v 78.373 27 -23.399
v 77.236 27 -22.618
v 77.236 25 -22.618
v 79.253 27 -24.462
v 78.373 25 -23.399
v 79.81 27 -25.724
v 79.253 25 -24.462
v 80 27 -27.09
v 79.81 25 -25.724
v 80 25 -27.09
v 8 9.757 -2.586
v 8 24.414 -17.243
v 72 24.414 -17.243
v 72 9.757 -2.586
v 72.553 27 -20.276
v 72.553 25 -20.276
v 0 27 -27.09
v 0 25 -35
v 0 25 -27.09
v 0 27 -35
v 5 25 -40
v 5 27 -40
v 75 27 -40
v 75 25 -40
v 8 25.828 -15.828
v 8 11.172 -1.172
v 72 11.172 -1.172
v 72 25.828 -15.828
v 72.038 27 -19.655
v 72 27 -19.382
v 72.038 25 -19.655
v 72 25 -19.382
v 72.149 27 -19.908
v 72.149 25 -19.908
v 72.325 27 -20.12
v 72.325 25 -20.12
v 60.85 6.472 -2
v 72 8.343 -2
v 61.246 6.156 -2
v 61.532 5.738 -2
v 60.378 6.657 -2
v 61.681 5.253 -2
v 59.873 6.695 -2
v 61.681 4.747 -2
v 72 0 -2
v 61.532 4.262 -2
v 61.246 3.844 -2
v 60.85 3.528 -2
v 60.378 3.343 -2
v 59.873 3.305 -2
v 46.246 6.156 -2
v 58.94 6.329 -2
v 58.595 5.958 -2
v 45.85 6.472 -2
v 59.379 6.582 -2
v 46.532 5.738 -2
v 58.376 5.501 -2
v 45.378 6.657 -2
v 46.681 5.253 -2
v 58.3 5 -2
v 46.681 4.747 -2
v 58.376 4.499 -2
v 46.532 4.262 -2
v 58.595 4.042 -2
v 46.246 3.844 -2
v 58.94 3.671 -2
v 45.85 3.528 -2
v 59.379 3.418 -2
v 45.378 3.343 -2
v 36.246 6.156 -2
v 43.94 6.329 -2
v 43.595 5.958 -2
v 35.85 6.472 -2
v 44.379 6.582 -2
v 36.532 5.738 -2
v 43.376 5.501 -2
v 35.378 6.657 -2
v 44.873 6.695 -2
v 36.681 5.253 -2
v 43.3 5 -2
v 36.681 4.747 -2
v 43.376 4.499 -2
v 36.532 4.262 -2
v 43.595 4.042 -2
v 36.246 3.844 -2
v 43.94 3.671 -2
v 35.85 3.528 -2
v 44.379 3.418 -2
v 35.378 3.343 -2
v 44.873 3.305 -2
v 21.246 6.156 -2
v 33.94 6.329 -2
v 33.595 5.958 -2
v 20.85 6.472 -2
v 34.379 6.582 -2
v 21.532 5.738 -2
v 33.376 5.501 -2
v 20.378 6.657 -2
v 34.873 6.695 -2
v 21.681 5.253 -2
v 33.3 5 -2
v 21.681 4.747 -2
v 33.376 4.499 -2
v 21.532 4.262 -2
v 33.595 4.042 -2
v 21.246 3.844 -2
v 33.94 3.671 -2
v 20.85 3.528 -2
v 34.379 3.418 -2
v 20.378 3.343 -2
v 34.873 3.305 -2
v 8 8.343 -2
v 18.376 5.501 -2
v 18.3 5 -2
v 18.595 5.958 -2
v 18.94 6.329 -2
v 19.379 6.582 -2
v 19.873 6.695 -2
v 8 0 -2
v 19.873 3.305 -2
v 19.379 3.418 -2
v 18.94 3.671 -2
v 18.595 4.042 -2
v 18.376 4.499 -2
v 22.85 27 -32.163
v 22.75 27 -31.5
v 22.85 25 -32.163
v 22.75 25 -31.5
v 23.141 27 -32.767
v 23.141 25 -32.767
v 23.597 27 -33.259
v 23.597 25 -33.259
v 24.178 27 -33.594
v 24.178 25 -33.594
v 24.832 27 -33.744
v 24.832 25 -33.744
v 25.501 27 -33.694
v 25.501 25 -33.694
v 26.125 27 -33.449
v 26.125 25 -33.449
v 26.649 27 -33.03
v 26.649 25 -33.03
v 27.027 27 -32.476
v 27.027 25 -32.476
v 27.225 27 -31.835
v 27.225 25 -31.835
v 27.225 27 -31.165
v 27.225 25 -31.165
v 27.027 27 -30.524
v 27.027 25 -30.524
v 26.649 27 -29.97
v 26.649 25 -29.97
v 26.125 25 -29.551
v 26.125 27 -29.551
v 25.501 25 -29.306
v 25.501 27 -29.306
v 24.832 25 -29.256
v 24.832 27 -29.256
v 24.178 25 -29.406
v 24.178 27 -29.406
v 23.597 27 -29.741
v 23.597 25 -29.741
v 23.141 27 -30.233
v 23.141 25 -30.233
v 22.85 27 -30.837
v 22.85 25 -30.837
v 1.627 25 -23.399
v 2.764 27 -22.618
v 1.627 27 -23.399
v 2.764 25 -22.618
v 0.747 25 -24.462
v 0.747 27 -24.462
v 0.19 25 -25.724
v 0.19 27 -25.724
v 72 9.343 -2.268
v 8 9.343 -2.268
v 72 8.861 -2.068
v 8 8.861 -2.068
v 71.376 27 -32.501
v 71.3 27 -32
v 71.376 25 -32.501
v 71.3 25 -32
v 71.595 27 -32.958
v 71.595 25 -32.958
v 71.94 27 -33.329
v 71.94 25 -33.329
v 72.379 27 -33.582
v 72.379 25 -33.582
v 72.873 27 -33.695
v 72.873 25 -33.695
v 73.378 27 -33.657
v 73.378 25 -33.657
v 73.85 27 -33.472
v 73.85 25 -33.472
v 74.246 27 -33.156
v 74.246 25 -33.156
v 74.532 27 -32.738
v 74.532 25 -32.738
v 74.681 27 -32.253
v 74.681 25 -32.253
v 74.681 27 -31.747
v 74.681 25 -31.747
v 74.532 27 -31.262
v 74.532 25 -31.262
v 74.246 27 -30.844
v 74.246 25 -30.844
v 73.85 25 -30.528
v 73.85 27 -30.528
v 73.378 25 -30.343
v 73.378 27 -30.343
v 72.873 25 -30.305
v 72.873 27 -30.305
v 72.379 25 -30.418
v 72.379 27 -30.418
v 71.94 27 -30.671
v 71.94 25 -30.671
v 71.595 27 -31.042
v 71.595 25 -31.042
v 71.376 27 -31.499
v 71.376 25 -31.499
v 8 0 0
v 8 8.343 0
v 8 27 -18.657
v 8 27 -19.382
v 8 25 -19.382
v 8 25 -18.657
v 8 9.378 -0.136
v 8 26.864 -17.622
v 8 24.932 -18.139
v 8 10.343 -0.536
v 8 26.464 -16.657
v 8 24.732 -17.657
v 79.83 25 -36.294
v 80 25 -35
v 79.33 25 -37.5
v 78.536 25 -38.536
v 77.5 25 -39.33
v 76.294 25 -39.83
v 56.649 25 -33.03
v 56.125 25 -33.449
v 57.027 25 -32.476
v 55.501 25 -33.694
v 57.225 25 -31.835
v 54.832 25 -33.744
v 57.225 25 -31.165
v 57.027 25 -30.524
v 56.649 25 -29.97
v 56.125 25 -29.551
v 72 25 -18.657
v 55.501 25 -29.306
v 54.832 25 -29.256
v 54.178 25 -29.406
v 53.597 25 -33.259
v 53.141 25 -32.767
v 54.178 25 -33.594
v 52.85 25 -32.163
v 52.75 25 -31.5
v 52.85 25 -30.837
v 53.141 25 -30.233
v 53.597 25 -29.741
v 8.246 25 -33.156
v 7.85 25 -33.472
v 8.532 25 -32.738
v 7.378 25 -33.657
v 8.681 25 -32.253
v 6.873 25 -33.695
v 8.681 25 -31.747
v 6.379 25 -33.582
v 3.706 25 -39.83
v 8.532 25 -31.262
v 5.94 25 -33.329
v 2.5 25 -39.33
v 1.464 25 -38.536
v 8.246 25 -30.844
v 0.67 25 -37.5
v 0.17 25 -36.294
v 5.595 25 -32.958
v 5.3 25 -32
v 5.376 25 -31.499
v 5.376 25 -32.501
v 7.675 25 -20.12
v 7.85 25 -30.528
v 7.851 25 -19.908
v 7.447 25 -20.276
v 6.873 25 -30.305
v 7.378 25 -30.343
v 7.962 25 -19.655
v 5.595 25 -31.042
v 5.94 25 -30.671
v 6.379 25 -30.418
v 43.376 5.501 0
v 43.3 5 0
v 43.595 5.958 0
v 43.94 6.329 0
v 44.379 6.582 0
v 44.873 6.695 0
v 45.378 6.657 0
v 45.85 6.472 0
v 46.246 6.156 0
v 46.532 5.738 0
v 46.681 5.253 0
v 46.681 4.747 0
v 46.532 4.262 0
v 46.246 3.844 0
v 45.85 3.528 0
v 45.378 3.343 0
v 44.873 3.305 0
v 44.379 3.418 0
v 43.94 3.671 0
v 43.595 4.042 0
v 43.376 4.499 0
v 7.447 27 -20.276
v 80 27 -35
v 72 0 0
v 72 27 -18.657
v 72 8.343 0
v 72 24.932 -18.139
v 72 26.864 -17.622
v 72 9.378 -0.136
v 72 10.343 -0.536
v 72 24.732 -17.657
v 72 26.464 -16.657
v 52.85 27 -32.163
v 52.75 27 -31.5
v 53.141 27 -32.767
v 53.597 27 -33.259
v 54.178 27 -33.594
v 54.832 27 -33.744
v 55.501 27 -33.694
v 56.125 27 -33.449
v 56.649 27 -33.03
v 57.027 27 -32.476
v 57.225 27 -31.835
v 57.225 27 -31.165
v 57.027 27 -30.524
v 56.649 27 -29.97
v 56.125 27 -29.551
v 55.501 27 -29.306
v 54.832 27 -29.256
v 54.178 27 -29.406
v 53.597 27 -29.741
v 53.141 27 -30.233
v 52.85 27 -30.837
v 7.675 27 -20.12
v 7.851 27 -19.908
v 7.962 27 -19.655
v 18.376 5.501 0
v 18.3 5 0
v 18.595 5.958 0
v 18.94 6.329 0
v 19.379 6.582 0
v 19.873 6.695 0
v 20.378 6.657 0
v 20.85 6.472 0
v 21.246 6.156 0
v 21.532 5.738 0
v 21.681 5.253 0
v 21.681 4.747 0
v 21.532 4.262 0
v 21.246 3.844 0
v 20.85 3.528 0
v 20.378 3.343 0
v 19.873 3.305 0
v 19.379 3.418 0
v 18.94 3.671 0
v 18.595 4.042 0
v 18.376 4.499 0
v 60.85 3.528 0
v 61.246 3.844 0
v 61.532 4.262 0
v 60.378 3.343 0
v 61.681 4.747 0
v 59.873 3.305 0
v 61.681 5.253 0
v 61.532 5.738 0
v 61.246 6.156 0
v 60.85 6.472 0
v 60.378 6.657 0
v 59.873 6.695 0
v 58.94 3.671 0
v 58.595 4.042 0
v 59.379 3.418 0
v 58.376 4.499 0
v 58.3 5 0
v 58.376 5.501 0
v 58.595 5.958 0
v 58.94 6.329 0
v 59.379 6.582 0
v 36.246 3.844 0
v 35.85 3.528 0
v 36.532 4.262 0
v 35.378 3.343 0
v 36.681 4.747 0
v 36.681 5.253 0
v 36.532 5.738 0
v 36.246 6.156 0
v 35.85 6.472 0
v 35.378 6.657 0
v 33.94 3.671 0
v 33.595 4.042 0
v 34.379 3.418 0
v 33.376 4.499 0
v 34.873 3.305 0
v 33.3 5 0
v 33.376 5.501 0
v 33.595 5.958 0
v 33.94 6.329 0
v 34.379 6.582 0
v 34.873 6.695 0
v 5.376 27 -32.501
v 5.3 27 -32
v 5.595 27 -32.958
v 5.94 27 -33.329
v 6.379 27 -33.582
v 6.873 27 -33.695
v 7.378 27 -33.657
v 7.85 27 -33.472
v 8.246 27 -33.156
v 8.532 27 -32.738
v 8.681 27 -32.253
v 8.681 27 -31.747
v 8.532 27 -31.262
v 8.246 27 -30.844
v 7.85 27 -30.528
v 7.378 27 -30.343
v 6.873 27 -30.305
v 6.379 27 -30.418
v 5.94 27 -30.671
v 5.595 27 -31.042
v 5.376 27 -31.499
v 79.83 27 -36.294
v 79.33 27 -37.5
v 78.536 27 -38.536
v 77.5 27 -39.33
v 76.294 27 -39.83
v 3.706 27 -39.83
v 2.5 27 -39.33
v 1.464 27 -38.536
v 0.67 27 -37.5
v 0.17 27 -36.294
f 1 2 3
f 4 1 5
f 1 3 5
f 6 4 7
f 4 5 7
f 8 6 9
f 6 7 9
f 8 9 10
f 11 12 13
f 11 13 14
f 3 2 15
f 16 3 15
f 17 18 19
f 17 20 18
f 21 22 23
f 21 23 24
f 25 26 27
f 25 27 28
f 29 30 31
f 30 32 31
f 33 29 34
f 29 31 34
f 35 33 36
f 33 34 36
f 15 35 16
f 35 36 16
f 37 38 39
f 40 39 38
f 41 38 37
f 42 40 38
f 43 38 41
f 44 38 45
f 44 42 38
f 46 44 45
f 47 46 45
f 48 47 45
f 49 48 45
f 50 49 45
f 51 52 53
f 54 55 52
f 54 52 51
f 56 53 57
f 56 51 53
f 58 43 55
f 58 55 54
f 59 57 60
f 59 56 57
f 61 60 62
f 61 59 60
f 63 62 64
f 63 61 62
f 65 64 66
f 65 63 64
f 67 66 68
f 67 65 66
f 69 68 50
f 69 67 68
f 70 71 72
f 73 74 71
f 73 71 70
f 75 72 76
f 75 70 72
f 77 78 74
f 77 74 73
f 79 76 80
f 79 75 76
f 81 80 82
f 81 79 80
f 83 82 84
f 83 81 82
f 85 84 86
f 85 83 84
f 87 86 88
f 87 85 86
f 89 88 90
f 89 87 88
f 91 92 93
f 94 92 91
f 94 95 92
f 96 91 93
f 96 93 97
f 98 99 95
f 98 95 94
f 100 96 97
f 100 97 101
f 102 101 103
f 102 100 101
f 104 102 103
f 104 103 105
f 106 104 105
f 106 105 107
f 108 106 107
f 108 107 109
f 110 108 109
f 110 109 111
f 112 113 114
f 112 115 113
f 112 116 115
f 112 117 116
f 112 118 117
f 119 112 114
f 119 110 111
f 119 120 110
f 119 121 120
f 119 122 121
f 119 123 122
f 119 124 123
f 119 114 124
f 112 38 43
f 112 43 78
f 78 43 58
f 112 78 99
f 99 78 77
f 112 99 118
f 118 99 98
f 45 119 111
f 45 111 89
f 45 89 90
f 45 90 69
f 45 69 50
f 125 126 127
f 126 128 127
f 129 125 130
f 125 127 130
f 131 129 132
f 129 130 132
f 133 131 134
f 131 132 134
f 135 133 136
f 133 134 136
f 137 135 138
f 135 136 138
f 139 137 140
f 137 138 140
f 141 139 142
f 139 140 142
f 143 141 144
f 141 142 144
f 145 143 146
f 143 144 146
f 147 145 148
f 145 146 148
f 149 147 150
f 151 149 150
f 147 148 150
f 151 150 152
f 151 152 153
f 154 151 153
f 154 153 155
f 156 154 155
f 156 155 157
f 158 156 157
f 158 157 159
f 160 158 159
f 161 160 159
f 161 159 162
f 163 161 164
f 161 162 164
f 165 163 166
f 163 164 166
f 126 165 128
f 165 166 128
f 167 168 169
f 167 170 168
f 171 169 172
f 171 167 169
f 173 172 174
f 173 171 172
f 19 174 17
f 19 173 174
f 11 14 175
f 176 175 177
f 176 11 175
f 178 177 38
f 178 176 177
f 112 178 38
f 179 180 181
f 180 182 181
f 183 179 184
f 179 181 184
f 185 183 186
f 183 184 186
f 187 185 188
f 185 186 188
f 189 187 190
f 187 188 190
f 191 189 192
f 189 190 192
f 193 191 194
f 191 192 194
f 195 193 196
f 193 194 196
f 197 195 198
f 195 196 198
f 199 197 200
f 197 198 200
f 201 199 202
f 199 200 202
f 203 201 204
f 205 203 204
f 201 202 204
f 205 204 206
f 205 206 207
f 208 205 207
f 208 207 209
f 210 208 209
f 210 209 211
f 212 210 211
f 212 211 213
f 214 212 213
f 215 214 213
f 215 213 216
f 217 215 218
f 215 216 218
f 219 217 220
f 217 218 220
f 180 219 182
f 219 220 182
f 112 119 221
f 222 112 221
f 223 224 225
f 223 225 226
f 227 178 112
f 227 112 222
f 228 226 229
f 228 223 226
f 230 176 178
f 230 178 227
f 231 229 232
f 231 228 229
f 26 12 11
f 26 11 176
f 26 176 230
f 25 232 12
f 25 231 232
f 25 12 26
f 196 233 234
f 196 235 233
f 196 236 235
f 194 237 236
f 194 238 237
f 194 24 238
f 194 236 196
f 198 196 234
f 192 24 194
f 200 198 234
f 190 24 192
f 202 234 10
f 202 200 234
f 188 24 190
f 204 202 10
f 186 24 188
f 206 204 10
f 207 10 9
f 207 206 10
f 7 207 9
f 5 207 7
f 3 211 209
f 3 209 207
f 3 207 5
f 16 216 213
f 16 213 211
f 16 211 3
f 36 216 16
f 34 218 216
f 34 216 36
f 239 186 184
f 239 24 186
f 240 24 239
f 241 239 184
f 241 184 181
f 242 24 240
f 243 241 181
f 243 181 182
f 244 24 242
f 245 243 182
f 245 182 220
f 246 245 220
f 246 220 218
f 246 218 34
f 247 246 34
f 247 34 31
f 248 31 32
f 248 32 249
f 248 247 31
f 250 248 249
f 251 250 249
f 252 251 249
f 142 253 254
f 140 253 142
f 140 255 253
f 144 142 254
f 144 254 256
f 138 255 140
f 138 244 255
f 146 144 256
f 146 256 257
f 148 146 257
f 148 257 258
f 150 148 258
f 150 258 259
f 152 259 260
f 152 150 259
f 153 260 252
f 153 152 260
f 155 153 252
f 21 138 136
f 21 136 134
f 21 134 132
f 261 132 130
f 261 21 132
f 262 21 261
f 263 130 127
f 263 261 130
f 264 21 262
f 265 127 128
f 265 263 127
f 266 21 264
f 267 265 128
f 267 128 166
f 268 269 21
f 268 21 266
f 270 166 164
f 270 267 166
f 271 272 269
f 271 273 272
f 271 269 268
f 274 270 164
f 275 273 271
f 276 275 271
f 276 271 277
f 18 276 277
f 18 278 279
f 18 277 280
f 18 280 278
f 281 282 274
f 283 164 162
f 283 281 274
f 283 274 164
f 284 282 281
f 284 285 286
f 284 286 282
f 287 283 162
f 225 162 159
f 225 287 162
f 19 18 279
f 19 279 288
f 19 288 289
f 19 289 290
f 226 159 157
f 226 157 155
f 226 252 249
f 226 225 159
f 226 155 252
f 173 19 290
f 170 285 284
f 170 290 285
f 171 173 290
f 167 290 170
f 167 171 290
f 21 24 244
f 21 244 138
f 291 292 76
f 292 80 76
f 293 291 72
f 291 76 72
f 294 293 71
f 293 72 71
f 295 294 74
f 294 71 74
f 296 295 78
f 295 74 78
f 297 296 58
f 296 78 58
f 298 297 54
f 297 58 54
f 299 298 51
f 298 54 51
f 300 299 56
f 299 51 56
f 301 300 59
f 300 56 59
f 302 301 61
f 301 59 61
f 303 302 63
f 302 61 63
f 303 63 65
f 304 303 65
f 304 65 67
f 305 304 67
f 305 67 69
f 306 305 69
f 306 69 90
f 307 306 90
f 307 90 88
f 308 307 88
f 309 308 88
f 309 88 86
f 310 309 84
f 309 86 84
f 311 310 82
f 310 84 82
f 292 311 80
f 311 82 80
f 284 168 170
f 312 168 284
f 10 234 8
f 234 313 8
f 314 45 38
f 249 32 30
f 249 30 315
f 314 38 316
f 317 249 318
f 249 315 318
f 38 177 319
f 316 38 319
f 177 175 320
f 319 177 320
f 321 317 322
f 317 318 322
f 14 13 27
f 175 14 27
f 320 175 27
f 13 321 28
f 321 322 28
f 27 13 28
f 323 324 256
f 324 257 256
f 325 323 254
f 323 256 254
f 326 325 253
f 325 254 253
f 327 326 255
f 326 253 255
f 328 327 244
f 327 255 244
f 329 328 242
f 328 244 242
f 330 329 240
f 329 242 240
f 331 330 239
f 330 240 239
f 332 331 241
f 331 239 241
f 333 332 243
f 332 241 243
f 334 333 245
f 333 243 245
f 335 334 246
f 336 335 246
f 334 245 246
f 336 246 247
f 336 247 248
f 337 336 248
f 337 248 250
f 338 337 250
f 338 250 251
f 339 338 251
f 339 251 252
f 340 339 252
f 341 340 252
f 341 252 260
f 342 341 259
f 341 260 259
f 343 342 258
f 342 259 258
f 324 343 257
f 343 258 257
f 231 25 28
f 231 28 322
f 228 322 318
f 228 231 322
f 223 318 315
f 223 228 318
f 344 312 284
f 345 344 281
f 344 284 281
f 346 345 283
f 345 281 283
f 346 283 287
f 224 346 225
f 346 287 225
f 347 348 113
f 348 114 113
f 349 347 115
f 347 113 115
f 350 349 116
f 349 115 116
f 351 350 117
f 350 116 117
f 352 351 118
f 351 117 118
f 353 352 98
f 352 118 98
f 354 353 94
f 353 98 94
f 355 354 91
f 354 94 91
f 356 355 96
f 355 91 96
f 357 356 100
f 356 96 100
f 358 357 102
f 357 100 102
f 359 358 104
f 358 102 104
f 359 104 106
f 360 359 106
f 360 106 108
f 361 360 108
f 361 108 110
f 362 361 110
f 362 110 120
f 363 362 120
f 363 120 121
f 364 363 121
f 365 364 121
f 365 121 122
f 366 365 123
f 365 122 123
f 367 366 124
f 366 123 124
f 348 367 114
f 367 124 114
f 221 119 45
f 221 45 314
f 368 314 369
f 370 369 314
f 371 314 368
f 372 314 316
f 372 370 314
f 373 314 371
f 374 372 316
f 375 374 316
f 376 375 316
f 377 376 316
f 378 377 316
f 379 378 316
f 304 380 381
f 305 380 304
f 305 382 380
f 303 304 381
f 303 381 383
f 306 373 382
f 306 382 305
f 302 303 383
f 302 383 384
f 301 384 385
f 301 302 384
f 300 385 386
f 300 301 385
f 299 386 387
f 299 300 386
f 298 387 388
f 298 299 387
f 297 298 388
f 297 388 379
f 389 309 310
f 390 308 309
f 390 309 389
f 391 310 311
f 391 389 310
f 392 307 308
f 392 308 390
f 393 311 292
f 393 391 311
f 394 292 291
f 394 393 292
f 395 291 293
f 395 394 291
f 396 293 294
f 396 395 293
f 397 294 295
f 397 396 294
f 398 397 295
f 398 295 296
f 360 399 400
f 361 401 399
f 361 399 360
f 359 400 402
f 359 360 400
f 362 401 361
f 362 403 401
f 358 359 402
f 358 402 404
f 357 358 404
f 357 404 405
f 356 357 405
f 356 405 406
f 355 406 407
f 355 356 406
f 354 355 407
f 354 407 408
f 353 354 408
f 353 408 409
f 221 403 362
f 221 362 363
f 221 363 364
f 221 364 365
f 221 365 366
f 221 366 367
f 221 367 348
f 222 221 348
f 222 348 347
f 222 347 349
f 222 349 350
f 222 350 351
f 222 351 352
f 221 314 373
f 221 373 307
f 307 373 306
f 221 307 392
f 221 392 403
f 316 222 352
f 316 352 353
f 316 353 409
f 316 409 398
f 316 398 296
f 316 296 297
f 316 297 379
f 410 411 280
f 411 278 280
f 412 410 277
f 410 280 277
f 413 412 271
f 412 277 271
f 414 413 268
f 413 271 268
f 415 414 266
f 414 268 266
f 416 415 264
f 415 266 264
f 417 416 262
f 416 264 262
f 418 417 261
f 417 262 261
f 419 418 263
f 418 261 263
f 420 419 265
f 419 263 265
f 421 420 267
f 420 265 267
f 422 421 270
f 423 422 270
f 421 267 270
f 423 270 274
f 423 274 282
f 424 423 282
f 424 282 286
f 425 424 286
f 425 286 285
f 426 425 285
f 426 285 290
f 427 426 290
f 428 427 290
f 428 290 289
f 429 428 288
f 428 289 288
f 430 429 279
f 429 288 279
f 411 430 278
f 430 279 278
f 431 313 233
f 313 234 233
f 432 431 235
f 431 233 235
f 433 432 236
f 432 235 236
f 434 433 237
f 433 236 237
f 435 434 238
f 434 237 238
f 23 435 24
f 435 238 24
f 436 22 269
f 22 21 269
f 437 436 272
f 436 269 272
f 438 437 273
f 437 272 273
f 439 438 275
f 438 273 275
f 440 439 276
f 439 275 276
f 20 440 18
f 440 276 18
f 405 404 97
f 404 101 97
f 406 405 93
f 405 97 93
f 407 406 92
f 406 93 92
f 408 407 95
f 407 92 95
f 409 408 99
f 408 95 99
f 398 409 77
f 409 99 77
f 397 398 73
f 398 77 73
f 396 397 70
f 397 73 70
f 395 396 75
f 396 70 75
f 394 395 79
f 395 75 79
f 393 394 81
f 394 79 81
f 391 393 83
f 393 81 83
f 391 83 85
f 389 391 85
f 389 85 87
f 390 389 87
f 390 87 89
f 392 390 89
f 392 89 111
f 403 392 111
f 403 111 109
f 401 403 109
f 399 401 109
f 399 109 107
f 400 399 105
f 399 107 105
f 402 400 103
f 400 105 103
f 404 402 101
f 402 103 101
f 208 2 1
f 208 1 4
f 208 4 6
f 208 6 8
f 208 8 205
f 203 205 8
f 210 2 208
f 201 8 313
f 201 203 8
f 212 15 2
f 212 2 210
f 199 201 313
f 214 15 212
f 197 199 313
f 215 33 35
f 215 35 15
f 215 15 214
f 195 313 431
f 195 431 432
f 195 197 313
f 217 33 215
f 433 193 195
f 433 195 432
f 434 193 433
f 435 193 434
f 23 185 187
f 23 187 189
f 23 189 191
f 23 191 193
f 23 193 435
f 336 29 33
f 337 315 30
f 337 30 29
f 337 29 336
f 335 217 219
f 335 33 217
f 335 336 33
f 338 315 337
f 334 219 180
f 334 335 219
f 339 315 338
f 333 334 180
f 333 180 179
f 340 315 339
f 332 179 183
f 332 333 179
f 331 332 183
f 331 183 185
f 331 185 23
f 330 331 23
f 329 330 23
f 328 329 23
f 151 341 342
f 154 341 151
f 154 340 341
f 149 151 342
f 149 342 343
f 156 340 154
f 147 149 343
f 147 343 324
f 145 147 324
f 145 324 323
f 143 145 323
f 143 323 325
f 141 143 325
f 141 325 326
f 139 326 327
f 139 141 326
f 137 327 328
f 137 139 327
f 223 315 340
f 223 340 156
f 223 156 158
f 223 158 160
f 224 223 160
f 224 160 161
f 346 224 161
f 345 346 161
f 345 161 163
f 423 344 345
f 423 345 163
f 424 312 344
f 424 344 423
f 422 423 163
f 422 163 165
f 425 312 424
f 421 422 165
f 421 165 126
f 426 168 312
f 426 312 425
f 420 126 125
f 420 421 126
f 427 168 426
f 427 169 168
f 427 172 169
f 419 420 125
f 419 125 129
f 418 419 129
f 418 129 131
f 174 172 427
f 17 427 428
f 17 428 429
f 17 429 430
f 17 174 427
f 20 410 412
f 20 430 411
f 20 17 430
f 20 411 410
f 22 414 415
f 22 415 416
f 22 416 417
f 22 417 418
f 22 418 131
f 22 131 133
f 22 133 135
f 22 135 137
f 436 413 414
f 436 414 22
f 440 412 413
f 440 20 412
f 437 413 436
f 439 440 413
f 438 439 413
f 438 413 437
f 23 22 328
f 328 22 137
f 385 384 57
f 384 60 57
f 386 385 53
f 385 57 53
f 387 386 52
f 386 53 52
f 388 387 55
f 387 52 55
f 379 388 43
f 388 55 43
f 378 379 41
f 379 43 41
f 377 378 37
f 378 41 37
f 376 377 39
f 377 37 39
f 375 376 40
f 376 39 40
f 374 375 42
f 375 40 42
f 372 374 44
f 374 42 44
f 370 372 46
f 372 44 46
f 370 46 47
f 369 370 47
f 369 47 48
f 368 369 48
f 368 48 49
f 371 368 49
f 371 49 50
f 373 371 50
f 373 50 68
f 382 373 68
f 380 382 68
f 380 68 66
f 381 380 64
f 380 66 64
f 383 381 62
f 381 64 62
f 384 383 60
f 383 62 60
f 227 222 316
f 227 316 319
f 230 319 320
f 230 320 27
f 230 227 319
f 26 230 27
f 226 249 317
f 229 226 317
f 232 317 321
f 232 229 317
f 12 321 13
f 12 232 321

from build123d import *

# Parameters (mm, degrees)
BASE_FLANGE1_DEPTH       = 80
CUT_EXTRUDE1_DEPTH       = 94.429117517
M3_CLEARANCE_HOLE1_D     = 3.4
M3_CLEARANCE_HOLE1_DEPTH = 2
M3_CLEARANCE_HOLE1_TIP   = 1.021463052
M4_CLEARANCE_HOLE1_D     = 4.5
M4_CLEARANCE_HOLE1_DEPTH = 2
M4_CLEARANCE_HOLE1_TIP   = 1.351936393
M3_CLEARANCE_HOLE2_D     = 3.4
M3_CLEARANCE_HOLE2_DEPTH = 2
M3_CLEARANCE_HOLE2_TIP   = 1.021463052
FILLET1_R                = 5
FILLET2_R                = 1


# Sheet-metal steps are written as plain solids
with BuildPart() as part:
    # Sketch1 → Base-Flange1 (new body)
    with BuildSketch(Plane(origin=(0, 0, 0), x_dir=(0, 0, -1), z_dir=(1, 0, 0))):
        with BuildLine():
            Line((0, 0), (0, 8.343145751))
            ThreePointArc((0, 8.343145751), (0.30448187, 9.87387948), (1.171572875, 11.171572875))
            Line((1.171572875, 11.171572875), (15.828427125, 25.828427125))
            ThreePointArc((15.828427125, 25.828427125), (17.12612052, 26.69551813), (18.656854249, 27))
            Line((18.656854249, 27), (40, 27))
            Line((40, 27), (40, 25))
            Line((40, 25), (18.656854249, 25))
            ThreePointArc((18.656854249, 25), (17.891487385, 24.847759065), (17.242640687, 24.414213562))
            Line((17.242640687, 24.414213562), (2.585786438, 9.757359313))
            ThreePointArc((2.585786438, 9.757359313), (2.152240935, 9.108512615), (2, 8.343145751))
            Line((2, 8.343145751), (2, 0))
            Line((2, 0), (0, 0))
        make_face()
    extrude(amount=BASE_FLANGE1_DEPTH)

    # Sketch2 → Cut-Extrude1 (cut, through all)
    with BuildSketch(Plane(origin=(0, 27, 0), x_dir=(1, 0, 0), z_dir=(0, 1, 0))):
        Polygon((0, 24), (8, 20), (8, 0), (0, 0), align=None)
        Polygon((80, 0), (80, 24), (72, 20), (72, 0), align=None)
    extrude(amount=-CUT_EXTRUDE1_DEPTH, mode=Mode.SUBTRACT)

    # M3 Clearance Hole1
    with Locations(Plane.XY):
        with Locations((20, 5), (35, 5), (45, 5), (60, 5)):
            Hole(M3_CLEARANCE_HOLE1_D / 2, depth=M3_CLEARANCE_HOLE1_DEPTH)
            with Locations((0, 0, -(M3_CLEARANCE_HOLE1_DEPTH + M3_CLEARANCE_HOLE1_TIP / 2))):  # 118° drill point
                Cone(0, M3_CLEARANCE_HOLE1_D / 2, M3_CLEARANCE_HOLE1_TIP, mode=Mode.SUBTRACT)

    # M4 Clearance Hole1
    with Locations(Plane(origin=(0, 27, 0), x_dir=(1, 0, 0), z_dir=(0, 1, 0))):
        with Locations((25, 31.5), (55, 31.5)):
            Hole(M4_CLEARANCE_HOLE1_D / 2, depth=M4_CLEARANCE_HOLE1_DEPTH)
            with Locations((0, 0, -(M4_CLEARANCE_HOLE1_DEPTH + M4_CLEARANCE_HOLE1_TIP / 2))):  # 118° drill point
                Cone(0, M4_CLEARANCE_HOLE1_D / 2, M4_CLEARANCE_HOLE1_TIP, mode=Mode.SUBTRACT)

    # M3 Clearance Hole2
    with Locations(Plane(origin=(0, 27, 0), x_dir=(1, 0, 0), z_dir=(0, 1, 0))):
        with Locations((7, 32), (73, 32)):
            Hole(M3_CLEARANCE_HOLE2_D / 2, depth=M3_CLEARANCE_HOLE2_DEPTH)
            with Locations((0, 0, -(M3_CLEARANCE_HOLE2_DEPTH + M3_CLEARANCE_HOLE2_TIP / 2))):  # 118° drill point
                Cone(0, M3_CLEARANCE_HOLE2_D / 2, M3_CLEARANCE_HOLE2_TIP, mode=Mode.SUBTRACT)

    # Fillet1
    fillet1_edges = [part.edges().sort_by_distance(p)[0] for p in [
        (0, 26, -40),
        (80, 26, -24),
        (80, 26, -40),
        (0, 26, -24),
    ]]
    fillet(fillet1_edges, radius=FILLET1_R)

    # Fillet2
    fillet2_edges = [part.edges().sort_by_distance(p)[0] for p in [
        (72, 26, -20),
        (8, 26, -20),
    ]]
    fillet(fillet2_edges, radius=FILLET2_R)


solid = part.part
